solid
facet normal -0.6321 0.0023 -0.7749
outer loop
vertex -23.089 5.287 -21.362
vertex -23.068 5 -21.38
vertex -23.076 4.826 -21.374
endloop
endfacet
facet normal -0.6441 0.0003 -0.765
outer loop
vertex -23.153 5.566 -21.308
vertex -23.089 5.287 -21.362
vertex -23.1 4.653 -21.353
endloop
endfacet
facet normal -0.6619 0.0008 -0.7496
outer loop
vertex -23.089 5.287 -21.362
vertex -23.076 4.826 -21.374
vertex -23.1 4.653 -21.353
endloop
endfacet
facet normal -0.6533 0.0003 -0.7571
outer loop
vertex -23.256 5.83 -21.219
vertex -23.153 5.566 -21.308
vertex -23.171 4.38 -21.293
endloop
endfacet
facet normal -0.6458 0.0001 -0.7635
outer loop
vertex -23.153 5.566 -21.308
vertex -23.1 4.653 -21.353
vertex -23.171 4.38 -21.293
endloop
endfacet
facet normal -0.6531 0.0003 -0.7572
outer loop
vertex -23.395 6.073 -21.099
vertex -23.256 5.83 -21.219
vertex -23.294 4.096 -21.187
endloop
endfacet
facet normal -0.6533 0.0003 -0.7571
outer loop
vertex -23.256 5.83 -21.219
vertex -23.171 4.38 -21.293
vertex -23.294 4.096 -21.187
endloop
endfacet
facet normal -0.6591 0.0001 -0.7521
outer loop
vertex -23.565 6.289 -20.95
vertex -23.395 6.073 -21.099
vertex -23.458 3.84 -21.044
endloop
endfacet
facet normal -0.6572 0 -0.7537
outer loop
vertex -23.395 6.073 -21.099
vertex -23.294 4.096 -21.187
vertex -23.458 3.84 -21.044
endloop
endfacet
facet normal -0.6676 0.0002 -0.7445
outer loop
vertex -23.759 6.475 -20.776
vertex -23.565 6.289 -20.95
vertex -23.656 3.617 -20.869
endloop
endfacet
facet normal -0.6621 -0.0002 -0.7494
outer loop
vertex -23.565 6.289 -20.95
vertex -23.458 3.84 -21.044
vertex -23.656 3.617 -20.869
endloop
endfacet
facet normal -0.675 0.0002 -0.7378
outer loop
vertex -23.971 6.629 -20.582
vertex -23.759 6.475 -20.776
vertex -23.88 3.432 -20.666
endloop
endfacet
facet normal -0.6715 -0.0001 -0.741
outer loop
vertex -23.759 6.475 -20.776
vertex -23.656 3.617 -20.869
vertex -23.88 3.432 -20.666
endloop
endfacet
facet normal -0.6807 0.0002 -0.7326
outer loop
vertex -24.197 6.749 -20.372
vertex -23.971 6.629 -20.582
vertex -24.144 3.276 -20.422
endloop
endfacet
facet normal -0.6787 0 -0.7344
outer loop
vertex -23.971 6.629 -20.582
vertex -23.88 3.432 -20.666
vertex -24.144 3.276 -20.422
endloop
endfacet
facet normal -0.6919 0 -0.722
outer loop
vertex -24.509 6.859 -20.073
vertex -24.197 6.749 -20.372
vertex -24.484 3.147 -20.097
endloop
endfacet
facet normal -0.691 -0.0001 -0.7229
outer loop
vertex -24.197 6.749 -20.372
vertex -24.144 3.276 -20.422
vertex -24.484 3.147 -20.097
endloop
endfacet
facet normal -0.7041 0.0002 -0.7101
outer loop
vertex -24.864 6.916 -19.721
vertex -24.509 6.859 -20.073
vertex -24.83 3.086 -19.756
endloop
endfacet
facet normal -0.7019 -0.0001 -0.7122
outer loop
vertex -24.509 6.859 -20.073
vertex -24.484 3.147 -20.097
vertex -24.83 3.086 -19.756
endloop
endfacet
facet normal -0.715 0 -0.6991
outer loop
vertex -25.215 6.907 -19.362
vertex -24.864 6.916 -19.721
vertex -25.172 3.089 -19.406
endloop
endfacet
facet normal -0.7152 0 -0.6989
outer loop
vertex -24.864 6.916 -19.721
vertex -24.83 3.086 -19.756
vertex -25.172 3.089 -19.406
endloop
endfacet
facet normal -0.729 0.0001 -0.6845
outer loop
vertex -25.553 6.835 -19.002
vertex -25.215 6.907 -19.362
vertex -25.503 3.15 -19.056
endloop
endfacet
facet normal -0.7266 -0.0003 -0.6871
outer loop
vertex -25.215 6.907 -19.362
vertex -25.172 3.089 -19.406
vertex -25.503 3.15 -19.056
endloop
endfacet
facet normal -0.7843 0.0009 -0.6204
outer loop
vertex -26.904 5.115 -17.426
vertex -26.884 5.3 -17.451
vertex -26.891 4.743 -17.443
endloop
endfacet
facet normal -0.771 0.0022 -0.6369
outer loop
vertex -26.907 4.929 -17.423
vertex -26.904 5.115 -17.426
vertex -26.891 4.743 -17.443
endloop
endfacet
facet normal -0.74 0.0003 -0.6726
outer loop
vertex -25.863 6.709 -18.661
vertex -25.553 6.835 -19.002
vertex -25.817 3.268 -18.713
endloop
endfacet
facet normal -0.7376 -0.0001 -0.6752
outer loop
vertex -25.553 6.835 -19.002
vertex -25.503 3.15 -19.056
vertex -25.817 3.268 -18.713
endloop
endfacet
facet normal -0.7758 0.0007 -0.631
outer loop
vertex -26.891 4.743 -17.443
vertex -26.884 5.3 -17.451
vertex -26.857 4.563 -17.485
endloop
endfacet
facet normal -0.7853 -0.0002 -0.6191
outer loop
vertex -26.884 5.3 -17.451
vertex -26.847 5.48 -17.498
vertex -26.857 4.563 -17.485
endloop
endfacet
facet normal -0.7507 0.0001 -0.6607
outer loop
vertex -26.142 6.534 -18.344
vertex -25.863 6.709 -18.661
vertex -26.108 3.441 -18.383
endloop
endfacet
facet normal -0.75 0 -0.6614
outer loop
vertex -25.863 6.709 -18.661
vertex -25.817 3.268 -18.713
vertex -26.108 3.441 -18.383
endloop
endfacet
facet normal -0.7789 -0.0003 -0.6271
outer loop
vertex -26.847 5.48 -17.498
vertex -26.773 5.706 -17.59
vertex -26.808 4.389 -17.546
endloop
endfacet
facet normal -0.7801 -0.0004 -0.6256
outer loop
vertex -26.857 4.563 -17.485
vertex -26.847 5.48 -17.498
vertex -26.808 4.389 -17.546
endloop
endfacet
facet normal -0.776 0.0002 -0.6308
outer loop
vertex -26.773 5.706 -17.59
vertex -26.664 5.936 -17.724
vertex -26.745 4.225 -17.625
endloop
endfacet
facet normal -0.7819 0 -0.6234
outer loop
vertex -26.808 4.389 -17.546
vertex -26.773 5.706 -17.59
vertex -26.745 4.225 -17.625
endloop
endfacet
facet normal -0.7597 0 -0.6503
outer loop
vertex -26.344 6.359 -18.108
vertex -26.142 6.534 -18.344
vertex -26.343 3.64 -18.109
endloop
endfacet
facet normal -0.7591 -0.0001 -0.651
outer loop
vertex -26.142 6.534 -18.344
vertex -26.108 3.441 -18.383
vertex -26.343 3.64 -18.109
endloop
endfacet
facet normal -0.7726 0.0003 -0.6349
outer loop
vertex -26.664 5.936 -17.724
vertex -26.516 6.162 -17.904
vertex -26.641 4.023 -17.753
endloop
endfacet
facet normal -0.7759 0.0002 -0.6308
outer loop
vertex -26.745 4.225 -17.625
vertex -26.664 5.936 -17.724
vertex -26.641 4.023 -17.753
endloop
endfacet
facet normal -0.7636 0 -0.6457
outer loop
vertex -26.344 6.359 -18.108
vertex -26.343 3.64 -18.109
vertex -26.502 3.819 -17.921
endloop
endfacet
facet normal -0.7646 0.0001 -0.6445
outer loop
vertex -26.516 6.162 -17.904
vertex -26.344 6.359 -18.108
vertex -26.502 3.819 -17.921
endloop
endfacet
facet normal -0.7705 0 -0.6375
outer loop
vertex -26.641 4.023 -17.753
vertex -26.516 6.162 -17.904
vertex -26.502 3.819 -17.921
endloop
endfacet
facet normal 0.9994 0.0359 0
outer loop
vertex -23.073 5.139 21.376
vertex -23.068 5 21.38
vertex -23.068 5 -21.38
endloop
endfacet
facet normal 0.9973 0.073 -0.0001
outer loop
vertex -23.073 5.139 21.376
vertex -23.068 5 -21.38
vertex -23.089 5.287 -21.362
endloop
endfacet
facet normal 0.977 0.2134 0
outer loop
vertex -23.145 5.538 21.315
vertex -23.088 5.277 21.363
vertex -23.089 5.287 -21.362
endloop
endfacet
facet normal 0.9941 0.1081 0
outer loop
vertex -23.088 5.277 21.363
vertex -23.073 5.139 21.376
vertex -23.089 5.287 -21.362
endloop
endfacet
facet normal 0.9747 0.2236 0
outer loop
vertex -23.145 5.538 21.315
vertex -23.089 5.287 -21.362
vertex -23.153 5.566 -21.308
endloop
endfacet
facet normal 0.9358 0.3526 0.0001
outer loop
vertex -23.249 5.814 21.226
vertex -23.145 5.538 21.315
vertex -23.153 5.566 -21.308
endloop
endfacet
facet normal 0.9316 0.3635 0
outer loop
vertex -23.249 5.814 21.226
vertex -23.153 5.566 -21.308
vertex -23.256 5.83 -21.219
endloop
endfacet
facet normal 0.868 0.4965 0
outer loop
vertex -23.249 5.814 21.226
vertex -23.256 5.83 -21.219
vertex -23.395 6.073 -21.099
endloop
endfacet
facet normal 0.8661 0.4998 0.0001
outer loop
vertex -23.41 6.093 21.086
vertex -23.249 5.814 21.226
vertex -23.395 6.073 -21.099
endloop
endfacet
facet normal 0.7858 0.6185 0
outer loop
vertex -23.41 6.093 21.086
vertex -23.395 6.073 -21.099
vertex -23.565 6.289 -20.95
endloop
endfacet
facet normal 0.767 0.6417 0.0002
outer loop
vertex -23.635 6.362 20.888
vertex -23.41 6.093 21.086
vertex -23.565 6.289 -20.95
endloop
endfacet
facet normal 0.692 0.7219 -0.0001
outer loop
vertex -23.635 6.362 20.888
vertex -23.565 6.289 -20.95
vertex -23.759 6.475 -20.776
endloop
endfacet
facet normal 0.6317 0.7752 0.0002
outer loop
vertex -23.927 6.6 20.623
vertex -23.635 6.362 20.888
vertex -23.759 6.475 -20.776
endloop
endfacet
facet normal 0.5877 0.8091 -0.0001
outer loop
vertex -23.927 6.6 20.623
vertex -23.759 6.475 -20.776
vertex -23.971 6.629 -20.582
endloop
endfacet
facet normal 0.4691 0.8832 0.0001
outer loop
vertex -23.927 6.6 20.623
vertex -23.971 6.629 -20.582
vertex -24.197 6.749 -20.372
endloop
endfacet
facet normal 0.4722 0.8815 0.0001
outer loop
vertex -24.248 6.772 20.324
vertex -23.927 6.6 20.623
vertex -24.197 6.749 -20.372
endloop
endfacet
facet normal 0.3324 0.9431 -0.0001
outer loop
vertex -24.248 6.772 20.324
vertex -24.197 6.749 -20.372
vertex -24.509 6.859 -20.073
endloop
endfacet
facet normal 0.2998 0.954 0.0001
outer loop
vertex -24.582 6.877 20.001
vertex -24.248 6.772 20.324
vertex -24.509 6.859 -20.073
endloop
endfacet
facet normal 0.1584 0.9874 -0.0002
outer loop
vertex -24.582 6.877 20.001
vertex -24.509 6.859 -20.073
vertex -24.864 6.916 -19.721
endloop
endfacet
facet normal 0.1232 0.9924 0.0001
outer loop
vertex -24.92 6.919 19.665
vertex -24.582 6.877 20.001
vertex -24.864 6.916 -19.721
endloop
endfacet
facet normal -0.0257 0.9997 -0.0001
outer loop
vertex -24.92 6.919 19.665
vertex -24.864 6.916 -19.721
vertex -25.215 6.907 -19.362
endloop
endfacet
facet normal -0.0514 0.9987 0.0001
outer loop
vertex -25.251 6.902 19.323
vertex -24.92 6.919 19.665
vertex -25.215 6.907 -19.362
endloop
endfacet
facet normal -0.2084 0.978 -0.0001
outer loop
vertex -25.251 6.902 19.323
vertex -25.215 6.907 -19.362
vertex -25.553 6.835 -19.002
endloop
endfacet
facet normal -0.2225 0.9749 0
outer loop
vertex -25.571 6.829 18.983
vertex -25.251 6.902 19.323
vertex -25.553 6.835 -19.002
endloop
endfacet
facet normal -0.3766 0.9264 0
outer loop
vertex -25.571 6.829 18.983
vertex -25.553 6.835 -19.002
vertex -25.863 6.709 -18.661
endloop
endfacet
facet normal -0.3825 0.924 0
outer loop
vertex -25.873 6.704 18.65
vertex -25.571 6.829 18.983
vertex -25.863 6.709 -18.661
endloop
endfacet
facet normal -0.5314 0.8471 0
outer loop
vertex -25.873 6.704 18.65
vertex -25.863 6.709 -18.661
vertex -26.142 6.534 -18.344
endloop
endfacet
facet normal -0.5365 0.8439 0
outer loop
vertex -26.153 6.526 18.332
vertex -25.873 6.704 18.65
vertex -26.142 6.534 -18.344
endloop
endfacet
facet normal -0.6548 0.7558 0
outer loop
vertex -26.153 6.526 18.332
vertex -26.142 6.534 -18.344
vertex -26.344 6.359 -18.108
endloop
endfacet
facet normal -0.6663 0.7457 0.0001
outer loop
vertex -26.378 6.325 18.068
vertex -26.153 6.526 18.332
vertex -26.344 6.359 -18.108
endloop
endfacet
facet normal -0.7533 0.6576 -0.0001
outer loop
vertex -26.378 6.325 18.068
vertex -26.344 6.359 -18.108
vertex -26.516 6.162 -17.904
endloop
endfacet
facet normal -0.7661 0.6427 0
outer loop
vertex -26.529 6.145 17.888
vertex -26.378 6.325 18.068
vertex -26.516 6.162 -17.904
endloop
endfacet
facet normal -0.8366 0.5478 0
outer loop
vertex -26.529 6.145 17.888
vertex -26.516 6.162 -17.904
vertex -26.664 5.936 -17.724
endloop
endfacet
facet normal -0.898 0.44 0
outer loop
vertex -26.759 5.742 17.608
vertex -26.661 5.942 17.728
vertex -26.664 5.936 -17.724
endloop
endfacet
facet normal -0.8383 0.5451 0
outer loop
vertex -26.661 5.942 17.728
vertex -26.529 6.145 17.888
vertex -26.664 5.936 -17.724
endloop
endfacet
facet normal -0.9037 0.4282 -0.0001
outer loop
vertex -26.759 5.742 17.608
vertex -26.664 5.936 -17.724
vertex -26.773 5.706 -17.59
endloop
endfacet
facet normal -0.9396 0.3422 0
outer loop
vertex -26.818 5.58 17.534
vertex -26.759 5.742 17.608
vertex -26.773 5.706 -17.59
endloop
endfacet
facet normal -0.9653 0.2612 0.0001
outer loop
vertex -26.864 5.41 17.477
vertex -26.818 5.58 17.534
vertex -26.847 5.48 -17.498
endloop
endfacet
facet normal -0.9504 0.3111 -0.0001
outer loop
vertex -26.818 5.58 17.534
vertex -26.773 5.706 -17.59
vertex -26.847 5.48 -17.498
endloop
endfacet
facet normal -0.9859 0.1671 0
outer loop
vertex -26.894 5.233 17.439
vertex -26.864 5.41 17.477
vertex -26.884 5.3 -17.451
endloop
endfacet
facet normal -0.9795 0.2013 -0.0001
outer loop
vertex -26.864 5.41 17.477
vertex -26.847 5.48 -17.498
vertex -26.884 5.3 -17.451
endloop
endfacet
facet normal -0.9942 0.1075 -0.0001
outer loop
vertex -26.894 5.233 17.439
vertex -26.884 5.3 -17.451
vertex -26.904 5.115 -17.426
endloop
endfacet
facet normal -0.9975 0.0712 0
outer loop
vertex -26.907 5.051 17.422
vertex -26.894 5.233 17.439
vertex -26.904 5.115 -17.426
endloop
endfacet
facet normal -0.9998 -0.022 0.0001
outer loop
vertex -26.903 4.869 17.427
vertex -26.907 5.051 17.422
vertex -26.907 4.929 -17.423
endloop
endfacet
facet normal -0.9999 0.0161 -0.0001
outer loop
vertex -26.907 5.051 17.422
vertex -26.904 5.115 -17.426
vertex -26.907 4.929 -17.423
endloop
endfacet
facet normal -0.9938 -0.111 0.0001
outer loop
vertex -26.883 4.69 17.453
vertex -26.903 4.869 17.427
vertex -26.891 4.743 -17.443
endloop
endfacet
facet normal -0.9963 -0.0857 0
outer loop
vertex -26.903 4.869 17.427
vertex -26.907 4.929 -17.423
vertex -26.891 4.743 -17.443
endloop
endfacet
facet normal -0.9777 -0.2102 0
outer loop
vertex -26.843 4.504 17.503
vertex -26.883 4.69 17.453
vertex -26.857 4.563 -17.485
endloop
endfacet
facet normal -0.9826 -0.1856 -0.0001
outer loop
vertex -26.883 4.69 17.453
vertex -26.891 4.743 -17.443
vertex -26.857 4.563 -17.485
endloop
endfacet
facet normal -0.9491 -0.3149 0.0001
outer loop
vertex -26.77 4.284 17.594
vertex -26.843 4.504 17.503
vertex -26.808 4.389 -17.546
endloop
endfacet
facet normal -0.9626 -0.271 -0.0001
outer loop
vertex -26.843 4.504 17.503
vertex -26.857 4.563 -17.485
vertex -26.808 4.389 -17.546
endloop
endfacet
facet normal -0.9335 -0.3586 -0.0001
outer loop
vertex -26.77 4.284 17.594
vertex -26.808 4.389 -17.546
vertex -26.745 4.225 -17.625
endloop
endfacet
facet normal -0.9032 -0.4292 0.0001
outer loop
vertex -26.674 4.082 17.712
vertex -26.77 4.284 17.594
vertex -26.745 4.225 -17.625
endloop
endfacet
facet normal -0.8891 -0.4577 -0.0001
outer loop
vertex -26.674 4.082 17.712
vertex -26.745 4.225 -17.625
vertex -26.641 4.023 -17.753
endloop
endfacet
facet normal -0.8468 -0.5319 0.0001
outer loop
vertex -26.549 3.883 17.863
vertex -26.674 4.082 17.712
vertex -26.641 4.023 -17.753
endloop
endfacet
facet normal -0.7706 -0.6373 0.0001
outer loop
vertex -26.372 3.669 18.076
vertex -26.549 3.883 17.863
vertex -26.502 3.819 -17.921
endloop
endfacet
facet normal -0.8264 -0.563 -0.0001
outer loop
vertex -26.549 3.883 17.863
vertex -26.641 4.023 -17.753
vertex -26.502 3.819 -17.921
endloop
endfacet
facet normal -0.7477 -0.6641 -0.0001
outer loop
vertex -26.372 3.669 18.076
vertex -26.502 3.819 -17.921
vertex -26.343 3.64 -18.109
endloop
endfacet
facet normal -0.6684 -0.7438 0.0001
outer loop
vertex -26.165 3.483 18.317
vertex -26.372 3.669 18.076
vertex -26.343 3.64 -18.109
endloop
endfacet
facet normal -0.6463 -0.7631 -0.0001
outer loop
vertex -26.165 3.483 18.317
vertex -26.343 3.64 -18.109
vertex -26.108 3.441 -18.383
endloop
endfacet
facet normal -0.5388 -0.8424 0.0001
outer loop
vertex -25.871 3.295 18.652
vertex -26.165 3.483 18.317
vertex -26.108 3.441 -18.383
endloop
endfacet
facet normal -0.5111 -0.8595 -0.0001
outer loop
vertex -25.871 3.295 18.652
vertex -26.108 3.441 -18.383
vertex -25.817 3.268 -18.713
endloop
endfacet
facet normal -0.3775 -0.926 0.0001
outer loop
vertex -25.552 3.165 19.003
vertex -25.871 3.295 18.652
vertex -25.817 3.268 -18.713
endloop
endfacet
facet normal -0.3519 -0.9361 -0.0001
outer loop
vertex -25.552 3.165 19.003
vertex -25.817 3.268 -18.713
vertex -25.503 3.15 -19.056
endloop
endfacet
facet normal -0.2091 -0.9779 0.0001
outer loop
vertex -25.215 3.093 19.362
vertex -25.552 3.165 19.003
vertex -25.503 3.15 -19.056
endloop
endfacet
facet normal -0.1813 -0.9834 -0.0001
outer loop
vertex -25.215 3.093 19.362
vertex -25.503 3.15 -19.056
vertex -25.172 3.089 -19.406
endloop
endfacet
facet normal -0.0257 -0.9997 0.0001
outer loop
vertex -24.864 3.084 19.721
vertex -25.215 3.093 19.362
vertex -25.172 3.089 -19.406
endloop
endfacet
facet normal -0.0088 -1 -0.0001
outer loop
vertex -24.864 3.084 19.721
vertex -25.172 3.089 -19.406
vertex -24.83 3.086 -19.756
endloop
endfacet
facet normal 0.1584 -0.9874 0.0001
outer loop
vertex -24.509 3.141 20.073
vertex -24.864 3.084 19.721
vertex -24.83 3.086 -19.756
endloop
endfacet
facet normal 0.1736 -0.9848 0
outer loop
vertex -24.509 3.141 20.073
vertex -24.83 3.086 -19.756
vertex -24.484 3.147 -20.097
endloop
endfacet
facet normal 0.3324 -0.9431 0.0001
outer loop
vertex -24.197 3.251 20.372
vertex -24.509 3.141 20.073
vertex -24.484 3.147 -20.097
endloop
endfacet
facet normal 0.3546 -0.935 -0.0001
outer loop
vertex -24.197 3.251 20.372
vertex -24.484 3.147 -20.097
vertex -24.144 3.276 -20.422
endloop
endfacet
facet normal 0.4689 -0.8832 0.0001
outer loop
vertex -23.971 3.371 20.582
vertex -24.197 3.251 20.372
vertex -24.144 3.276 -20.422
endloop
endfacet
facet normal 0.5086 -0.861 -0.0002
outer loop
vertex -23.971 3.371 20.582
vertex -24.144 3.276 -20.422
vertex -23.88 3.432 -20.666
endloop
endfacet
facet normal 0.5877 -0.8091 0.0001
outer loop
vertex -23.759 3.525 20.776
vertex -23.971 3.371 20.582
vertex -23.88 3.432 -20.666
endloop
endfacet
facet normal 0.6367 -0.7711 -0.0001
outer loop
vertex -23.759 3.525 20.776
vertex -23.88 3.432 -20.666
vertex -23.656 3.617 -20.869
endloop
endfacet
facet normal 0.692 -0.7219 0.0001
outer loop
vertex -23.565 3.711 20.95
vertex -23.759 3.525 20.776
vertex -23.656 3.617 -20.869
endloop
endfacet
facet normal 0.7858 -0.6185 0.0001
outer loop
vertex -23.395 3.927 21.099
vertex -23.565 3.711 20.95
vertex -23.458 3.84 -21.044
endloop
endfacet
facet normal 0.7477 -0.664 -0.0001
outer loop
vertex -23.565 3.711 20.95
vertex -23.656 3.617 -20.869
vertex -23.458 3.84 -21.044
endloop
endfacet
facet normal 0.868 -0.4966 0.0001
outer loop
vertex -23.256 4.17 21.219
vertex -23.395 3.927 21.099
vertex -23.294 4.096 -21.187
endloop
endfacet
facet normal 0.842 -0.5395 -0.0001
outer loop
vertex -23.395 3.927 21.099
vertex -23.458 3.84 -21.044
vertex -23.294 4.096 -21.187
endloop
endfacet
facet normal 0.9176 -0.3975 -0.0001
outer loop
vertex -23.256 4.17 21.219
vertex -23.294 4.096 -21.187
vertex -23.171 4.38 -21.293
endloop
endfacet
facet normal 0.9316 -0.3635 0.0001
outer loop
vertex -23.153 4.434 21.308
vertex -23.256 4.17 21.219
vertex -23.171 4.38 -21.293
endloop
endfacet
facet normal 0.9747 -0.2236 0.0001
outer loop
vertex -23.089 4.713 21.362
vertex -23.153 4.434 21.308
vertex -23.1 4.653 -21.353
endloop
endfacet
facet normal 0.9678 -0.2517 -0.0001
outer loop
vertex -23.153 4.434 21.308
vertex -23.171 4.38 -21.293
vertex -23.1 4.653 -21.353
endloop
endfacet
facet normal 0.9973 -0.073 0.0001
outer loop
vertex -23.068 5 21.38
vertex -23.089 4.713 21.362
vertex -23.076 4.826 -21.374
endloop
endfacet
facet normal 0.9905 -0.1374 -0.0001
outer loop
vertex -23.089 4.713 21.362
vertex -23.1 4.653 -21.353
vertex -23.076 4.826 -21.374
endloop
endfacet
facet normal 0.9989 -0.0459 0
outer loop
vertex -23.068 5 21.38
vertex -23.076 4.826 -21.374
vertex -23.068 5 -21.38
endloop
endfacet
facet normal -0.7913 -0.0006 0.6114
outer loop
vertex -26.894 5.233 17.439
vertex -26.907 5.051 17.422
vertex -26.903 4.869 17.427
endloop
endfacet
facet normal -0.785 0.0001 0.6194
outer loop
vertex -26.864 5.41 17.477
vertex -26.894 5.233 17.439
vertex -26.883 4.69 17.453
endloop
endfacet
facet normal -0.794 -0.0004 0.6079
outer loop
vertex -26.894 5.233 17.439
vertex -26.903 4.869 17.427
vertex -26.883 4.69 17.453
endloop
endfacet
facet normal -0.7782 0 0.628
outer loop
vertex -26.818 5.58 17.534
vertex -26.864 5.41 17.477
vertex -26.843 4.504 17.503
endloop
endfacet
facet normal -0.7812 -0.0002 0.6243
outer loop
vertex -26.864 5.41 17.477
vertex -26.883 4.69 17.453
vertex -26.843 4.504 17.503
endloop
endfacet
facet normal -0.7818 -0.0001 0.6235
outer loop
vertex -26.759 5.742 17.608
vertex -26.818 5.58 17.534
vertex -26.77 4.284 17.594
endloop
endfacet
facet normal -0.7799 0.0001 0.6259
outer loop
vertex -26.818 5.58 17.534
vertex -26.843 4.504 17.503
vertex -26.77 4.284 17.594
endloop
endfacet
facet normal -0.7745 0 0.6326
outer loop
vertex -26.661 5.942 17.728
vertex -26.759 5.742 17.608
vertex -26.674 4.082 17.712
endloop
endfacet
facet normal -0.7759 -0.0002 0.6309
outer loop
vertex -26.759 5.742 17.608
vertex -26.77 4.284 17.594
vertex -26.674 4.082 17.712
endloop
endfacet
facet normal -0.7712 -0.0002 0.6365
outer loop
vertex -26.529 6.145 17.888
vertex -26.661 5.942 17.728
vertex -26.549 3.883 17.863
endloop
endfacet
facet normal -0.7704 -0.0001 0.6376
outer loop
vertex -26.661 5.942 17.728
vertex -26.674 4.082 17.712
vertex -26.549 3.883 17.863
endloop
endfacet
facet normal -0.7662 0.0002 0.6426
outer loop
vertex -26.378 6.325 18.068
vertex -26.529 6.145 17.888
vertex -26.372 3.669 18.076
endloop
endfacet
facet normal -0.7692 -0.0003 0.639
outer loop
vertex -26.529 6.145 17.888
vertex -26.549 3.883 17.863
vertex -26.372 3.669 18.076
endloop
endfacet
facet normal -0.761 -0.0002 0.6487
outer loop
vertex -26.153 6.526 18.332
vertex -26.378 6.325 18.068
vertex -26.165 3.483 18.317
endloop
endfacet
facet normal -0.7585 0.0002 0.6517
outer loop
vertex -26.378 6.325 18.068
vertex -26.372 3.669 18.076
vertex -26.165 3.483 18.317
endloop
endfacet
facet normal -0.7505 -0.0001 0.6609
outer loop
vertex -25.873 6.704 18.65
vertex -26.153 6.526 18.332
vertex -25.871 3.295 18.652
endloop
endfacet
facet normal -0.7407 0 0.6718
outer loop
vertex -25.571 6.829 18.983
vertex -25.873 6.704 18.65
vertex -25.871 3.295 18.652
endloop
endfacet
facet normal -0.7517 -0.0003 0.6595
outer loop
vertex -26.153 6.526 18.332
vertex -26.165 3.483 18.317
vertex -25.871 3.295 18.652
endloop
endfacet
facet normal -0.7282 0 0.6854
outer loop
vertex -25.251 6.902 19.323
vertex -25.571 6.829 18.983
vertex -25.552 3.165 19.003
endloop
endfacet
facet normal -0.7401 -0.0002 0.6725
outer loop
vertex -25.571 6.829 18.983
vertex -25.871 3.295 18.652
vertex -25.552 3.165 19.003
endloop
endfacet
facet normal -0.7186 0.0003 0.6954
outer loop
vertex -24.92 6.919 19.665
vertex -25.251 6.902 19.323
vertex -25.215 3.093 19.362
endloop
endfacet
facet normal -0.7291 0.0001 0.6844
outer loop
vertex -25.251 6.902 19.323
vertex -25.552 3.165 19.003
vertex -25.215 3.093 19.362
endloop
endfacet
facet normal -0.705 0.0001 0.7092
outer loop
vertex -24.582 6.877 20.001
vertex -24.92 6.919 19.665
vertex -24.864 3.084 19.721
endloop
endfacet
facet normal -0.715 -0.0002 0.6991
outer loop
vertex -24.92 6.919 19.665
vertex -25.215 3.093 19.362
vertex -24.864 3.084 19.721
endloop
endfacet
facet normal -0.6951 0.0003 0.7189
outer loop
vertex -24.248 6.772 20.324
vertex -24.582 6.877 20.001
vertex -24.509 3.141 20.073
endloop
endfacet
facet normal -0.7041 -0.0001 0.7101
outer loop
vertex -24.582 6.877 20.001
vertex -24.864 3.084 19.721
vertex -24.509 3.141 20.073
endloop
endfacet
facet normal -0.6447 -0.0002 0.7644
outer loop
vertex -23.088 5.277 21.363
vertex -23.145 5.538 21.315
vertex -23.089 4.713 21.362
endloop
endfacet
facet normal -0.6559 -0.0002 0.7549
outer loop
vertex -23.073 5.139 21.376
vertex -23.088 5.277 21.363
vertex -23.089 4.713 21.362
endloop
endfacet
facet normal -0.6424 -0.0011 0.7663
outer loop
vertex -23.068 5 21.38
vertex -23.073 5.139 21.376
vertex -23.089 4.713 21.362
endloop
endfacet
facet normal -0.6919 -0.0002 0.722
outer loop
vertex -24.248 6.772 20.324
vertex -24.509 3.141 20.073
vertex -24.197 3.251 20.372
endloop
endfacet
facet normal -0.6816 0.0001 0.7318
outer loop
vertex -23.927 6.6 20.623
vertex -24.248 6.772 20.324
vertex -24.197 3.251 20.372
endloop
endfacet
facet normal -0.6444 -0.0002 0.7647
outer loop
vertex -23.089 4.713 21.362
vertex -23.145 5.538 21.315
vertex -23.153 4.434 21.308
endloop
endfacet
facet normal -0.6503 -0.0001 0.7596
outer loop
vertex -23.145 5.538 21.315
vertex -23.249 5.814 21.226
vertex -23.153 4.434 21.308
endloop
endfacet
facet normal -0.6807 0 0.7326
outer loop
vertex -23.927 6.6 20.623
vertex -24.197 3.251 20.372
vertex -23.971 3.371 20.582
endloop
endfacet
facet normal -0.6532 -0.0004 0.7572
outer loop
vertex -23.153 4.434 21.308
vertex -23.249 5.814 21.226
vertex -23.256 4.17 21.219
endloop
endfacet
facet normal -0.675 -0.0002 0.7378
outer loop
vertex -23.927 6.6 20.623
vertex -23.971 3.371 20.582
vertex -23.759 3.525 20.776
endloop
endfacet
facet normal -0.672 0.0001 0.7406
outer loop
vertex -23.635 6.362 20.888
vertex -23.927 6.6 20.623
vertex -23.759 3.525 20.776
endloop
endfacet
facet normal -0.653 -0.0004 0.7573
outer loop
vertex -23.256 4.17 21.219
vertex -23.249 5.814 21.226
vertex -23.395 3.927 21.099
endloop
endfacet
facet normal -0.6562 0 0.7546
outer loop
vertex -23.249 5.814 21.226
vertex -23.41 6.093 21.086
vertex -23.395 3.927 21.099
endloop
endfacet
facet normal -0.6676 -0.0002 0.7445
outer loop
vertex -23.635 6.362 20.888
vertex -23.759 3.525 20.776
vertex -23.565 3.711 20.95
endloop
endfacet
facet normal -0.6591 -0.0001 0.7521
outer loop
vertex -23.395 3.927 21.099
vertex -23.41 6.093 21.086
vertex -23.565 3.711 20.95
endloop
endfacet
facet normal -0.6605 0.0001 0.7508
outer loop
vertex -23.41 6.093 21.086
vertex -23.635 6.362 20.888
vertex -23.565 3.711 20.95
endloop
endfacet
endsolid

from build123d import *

# Parameters (mm, degrees)
BOSS_EXTRUDE1_DEPTH      = 40
BOSS_EXTRUDE1_DEPTH_BACK = 40
SKETCH3_R                = 2.4
CUT_EXTRUDE1_START       = 2.6
SKETCH1_R                = 50
SKETCH1_R_2              = 35
CUT_EXTRUDE1_DEPTH       = 4.8
SCALE1_SCALE             = 0.8


with BuildPart() as part:
    # Sketch3 → Boss-Extrude1 (new, two sides: drawn at the far end of the back side and taken through both)
    with BuildSketch(Plane.XY.offset(-BOSS_EXTRUDE1_DEPTH_BACK)):
        with Locations((-25, 5)):
            Circle(SKETCH3_R)
    extrude(amount=BOSS_EXTRUDE1_DEPTH + BOSS_EXTRUDE1_DEPTH_BACK)

    # Sketch1 → Cut-Extrude1 (cut)
    with BuildSketch(Plane(origin=(0, 0, 0), x_dir=(1, 0, 0), z_dir=(0, 1, 0)).offset(CUT_EXTRUDE1_START)):
        Circle(SKETCH1_R)
        Circle(SKETCH1_R_2, mode=Mode.SUBTRACT)
    extrude(amount=CUT_EXTRUDE1_DEPTH, mode=Mode.SUBTRACT)


with BuildPart() as part_1:
    # Scale1: scaled about (-24.939549166, 4.999999342, -0.000153755)
    add(part.part.scale(SCALE1_SCALE).moved(Location((-4.987909833, 0.999999868, -3.0751e-05))))


solid = part_1.part
